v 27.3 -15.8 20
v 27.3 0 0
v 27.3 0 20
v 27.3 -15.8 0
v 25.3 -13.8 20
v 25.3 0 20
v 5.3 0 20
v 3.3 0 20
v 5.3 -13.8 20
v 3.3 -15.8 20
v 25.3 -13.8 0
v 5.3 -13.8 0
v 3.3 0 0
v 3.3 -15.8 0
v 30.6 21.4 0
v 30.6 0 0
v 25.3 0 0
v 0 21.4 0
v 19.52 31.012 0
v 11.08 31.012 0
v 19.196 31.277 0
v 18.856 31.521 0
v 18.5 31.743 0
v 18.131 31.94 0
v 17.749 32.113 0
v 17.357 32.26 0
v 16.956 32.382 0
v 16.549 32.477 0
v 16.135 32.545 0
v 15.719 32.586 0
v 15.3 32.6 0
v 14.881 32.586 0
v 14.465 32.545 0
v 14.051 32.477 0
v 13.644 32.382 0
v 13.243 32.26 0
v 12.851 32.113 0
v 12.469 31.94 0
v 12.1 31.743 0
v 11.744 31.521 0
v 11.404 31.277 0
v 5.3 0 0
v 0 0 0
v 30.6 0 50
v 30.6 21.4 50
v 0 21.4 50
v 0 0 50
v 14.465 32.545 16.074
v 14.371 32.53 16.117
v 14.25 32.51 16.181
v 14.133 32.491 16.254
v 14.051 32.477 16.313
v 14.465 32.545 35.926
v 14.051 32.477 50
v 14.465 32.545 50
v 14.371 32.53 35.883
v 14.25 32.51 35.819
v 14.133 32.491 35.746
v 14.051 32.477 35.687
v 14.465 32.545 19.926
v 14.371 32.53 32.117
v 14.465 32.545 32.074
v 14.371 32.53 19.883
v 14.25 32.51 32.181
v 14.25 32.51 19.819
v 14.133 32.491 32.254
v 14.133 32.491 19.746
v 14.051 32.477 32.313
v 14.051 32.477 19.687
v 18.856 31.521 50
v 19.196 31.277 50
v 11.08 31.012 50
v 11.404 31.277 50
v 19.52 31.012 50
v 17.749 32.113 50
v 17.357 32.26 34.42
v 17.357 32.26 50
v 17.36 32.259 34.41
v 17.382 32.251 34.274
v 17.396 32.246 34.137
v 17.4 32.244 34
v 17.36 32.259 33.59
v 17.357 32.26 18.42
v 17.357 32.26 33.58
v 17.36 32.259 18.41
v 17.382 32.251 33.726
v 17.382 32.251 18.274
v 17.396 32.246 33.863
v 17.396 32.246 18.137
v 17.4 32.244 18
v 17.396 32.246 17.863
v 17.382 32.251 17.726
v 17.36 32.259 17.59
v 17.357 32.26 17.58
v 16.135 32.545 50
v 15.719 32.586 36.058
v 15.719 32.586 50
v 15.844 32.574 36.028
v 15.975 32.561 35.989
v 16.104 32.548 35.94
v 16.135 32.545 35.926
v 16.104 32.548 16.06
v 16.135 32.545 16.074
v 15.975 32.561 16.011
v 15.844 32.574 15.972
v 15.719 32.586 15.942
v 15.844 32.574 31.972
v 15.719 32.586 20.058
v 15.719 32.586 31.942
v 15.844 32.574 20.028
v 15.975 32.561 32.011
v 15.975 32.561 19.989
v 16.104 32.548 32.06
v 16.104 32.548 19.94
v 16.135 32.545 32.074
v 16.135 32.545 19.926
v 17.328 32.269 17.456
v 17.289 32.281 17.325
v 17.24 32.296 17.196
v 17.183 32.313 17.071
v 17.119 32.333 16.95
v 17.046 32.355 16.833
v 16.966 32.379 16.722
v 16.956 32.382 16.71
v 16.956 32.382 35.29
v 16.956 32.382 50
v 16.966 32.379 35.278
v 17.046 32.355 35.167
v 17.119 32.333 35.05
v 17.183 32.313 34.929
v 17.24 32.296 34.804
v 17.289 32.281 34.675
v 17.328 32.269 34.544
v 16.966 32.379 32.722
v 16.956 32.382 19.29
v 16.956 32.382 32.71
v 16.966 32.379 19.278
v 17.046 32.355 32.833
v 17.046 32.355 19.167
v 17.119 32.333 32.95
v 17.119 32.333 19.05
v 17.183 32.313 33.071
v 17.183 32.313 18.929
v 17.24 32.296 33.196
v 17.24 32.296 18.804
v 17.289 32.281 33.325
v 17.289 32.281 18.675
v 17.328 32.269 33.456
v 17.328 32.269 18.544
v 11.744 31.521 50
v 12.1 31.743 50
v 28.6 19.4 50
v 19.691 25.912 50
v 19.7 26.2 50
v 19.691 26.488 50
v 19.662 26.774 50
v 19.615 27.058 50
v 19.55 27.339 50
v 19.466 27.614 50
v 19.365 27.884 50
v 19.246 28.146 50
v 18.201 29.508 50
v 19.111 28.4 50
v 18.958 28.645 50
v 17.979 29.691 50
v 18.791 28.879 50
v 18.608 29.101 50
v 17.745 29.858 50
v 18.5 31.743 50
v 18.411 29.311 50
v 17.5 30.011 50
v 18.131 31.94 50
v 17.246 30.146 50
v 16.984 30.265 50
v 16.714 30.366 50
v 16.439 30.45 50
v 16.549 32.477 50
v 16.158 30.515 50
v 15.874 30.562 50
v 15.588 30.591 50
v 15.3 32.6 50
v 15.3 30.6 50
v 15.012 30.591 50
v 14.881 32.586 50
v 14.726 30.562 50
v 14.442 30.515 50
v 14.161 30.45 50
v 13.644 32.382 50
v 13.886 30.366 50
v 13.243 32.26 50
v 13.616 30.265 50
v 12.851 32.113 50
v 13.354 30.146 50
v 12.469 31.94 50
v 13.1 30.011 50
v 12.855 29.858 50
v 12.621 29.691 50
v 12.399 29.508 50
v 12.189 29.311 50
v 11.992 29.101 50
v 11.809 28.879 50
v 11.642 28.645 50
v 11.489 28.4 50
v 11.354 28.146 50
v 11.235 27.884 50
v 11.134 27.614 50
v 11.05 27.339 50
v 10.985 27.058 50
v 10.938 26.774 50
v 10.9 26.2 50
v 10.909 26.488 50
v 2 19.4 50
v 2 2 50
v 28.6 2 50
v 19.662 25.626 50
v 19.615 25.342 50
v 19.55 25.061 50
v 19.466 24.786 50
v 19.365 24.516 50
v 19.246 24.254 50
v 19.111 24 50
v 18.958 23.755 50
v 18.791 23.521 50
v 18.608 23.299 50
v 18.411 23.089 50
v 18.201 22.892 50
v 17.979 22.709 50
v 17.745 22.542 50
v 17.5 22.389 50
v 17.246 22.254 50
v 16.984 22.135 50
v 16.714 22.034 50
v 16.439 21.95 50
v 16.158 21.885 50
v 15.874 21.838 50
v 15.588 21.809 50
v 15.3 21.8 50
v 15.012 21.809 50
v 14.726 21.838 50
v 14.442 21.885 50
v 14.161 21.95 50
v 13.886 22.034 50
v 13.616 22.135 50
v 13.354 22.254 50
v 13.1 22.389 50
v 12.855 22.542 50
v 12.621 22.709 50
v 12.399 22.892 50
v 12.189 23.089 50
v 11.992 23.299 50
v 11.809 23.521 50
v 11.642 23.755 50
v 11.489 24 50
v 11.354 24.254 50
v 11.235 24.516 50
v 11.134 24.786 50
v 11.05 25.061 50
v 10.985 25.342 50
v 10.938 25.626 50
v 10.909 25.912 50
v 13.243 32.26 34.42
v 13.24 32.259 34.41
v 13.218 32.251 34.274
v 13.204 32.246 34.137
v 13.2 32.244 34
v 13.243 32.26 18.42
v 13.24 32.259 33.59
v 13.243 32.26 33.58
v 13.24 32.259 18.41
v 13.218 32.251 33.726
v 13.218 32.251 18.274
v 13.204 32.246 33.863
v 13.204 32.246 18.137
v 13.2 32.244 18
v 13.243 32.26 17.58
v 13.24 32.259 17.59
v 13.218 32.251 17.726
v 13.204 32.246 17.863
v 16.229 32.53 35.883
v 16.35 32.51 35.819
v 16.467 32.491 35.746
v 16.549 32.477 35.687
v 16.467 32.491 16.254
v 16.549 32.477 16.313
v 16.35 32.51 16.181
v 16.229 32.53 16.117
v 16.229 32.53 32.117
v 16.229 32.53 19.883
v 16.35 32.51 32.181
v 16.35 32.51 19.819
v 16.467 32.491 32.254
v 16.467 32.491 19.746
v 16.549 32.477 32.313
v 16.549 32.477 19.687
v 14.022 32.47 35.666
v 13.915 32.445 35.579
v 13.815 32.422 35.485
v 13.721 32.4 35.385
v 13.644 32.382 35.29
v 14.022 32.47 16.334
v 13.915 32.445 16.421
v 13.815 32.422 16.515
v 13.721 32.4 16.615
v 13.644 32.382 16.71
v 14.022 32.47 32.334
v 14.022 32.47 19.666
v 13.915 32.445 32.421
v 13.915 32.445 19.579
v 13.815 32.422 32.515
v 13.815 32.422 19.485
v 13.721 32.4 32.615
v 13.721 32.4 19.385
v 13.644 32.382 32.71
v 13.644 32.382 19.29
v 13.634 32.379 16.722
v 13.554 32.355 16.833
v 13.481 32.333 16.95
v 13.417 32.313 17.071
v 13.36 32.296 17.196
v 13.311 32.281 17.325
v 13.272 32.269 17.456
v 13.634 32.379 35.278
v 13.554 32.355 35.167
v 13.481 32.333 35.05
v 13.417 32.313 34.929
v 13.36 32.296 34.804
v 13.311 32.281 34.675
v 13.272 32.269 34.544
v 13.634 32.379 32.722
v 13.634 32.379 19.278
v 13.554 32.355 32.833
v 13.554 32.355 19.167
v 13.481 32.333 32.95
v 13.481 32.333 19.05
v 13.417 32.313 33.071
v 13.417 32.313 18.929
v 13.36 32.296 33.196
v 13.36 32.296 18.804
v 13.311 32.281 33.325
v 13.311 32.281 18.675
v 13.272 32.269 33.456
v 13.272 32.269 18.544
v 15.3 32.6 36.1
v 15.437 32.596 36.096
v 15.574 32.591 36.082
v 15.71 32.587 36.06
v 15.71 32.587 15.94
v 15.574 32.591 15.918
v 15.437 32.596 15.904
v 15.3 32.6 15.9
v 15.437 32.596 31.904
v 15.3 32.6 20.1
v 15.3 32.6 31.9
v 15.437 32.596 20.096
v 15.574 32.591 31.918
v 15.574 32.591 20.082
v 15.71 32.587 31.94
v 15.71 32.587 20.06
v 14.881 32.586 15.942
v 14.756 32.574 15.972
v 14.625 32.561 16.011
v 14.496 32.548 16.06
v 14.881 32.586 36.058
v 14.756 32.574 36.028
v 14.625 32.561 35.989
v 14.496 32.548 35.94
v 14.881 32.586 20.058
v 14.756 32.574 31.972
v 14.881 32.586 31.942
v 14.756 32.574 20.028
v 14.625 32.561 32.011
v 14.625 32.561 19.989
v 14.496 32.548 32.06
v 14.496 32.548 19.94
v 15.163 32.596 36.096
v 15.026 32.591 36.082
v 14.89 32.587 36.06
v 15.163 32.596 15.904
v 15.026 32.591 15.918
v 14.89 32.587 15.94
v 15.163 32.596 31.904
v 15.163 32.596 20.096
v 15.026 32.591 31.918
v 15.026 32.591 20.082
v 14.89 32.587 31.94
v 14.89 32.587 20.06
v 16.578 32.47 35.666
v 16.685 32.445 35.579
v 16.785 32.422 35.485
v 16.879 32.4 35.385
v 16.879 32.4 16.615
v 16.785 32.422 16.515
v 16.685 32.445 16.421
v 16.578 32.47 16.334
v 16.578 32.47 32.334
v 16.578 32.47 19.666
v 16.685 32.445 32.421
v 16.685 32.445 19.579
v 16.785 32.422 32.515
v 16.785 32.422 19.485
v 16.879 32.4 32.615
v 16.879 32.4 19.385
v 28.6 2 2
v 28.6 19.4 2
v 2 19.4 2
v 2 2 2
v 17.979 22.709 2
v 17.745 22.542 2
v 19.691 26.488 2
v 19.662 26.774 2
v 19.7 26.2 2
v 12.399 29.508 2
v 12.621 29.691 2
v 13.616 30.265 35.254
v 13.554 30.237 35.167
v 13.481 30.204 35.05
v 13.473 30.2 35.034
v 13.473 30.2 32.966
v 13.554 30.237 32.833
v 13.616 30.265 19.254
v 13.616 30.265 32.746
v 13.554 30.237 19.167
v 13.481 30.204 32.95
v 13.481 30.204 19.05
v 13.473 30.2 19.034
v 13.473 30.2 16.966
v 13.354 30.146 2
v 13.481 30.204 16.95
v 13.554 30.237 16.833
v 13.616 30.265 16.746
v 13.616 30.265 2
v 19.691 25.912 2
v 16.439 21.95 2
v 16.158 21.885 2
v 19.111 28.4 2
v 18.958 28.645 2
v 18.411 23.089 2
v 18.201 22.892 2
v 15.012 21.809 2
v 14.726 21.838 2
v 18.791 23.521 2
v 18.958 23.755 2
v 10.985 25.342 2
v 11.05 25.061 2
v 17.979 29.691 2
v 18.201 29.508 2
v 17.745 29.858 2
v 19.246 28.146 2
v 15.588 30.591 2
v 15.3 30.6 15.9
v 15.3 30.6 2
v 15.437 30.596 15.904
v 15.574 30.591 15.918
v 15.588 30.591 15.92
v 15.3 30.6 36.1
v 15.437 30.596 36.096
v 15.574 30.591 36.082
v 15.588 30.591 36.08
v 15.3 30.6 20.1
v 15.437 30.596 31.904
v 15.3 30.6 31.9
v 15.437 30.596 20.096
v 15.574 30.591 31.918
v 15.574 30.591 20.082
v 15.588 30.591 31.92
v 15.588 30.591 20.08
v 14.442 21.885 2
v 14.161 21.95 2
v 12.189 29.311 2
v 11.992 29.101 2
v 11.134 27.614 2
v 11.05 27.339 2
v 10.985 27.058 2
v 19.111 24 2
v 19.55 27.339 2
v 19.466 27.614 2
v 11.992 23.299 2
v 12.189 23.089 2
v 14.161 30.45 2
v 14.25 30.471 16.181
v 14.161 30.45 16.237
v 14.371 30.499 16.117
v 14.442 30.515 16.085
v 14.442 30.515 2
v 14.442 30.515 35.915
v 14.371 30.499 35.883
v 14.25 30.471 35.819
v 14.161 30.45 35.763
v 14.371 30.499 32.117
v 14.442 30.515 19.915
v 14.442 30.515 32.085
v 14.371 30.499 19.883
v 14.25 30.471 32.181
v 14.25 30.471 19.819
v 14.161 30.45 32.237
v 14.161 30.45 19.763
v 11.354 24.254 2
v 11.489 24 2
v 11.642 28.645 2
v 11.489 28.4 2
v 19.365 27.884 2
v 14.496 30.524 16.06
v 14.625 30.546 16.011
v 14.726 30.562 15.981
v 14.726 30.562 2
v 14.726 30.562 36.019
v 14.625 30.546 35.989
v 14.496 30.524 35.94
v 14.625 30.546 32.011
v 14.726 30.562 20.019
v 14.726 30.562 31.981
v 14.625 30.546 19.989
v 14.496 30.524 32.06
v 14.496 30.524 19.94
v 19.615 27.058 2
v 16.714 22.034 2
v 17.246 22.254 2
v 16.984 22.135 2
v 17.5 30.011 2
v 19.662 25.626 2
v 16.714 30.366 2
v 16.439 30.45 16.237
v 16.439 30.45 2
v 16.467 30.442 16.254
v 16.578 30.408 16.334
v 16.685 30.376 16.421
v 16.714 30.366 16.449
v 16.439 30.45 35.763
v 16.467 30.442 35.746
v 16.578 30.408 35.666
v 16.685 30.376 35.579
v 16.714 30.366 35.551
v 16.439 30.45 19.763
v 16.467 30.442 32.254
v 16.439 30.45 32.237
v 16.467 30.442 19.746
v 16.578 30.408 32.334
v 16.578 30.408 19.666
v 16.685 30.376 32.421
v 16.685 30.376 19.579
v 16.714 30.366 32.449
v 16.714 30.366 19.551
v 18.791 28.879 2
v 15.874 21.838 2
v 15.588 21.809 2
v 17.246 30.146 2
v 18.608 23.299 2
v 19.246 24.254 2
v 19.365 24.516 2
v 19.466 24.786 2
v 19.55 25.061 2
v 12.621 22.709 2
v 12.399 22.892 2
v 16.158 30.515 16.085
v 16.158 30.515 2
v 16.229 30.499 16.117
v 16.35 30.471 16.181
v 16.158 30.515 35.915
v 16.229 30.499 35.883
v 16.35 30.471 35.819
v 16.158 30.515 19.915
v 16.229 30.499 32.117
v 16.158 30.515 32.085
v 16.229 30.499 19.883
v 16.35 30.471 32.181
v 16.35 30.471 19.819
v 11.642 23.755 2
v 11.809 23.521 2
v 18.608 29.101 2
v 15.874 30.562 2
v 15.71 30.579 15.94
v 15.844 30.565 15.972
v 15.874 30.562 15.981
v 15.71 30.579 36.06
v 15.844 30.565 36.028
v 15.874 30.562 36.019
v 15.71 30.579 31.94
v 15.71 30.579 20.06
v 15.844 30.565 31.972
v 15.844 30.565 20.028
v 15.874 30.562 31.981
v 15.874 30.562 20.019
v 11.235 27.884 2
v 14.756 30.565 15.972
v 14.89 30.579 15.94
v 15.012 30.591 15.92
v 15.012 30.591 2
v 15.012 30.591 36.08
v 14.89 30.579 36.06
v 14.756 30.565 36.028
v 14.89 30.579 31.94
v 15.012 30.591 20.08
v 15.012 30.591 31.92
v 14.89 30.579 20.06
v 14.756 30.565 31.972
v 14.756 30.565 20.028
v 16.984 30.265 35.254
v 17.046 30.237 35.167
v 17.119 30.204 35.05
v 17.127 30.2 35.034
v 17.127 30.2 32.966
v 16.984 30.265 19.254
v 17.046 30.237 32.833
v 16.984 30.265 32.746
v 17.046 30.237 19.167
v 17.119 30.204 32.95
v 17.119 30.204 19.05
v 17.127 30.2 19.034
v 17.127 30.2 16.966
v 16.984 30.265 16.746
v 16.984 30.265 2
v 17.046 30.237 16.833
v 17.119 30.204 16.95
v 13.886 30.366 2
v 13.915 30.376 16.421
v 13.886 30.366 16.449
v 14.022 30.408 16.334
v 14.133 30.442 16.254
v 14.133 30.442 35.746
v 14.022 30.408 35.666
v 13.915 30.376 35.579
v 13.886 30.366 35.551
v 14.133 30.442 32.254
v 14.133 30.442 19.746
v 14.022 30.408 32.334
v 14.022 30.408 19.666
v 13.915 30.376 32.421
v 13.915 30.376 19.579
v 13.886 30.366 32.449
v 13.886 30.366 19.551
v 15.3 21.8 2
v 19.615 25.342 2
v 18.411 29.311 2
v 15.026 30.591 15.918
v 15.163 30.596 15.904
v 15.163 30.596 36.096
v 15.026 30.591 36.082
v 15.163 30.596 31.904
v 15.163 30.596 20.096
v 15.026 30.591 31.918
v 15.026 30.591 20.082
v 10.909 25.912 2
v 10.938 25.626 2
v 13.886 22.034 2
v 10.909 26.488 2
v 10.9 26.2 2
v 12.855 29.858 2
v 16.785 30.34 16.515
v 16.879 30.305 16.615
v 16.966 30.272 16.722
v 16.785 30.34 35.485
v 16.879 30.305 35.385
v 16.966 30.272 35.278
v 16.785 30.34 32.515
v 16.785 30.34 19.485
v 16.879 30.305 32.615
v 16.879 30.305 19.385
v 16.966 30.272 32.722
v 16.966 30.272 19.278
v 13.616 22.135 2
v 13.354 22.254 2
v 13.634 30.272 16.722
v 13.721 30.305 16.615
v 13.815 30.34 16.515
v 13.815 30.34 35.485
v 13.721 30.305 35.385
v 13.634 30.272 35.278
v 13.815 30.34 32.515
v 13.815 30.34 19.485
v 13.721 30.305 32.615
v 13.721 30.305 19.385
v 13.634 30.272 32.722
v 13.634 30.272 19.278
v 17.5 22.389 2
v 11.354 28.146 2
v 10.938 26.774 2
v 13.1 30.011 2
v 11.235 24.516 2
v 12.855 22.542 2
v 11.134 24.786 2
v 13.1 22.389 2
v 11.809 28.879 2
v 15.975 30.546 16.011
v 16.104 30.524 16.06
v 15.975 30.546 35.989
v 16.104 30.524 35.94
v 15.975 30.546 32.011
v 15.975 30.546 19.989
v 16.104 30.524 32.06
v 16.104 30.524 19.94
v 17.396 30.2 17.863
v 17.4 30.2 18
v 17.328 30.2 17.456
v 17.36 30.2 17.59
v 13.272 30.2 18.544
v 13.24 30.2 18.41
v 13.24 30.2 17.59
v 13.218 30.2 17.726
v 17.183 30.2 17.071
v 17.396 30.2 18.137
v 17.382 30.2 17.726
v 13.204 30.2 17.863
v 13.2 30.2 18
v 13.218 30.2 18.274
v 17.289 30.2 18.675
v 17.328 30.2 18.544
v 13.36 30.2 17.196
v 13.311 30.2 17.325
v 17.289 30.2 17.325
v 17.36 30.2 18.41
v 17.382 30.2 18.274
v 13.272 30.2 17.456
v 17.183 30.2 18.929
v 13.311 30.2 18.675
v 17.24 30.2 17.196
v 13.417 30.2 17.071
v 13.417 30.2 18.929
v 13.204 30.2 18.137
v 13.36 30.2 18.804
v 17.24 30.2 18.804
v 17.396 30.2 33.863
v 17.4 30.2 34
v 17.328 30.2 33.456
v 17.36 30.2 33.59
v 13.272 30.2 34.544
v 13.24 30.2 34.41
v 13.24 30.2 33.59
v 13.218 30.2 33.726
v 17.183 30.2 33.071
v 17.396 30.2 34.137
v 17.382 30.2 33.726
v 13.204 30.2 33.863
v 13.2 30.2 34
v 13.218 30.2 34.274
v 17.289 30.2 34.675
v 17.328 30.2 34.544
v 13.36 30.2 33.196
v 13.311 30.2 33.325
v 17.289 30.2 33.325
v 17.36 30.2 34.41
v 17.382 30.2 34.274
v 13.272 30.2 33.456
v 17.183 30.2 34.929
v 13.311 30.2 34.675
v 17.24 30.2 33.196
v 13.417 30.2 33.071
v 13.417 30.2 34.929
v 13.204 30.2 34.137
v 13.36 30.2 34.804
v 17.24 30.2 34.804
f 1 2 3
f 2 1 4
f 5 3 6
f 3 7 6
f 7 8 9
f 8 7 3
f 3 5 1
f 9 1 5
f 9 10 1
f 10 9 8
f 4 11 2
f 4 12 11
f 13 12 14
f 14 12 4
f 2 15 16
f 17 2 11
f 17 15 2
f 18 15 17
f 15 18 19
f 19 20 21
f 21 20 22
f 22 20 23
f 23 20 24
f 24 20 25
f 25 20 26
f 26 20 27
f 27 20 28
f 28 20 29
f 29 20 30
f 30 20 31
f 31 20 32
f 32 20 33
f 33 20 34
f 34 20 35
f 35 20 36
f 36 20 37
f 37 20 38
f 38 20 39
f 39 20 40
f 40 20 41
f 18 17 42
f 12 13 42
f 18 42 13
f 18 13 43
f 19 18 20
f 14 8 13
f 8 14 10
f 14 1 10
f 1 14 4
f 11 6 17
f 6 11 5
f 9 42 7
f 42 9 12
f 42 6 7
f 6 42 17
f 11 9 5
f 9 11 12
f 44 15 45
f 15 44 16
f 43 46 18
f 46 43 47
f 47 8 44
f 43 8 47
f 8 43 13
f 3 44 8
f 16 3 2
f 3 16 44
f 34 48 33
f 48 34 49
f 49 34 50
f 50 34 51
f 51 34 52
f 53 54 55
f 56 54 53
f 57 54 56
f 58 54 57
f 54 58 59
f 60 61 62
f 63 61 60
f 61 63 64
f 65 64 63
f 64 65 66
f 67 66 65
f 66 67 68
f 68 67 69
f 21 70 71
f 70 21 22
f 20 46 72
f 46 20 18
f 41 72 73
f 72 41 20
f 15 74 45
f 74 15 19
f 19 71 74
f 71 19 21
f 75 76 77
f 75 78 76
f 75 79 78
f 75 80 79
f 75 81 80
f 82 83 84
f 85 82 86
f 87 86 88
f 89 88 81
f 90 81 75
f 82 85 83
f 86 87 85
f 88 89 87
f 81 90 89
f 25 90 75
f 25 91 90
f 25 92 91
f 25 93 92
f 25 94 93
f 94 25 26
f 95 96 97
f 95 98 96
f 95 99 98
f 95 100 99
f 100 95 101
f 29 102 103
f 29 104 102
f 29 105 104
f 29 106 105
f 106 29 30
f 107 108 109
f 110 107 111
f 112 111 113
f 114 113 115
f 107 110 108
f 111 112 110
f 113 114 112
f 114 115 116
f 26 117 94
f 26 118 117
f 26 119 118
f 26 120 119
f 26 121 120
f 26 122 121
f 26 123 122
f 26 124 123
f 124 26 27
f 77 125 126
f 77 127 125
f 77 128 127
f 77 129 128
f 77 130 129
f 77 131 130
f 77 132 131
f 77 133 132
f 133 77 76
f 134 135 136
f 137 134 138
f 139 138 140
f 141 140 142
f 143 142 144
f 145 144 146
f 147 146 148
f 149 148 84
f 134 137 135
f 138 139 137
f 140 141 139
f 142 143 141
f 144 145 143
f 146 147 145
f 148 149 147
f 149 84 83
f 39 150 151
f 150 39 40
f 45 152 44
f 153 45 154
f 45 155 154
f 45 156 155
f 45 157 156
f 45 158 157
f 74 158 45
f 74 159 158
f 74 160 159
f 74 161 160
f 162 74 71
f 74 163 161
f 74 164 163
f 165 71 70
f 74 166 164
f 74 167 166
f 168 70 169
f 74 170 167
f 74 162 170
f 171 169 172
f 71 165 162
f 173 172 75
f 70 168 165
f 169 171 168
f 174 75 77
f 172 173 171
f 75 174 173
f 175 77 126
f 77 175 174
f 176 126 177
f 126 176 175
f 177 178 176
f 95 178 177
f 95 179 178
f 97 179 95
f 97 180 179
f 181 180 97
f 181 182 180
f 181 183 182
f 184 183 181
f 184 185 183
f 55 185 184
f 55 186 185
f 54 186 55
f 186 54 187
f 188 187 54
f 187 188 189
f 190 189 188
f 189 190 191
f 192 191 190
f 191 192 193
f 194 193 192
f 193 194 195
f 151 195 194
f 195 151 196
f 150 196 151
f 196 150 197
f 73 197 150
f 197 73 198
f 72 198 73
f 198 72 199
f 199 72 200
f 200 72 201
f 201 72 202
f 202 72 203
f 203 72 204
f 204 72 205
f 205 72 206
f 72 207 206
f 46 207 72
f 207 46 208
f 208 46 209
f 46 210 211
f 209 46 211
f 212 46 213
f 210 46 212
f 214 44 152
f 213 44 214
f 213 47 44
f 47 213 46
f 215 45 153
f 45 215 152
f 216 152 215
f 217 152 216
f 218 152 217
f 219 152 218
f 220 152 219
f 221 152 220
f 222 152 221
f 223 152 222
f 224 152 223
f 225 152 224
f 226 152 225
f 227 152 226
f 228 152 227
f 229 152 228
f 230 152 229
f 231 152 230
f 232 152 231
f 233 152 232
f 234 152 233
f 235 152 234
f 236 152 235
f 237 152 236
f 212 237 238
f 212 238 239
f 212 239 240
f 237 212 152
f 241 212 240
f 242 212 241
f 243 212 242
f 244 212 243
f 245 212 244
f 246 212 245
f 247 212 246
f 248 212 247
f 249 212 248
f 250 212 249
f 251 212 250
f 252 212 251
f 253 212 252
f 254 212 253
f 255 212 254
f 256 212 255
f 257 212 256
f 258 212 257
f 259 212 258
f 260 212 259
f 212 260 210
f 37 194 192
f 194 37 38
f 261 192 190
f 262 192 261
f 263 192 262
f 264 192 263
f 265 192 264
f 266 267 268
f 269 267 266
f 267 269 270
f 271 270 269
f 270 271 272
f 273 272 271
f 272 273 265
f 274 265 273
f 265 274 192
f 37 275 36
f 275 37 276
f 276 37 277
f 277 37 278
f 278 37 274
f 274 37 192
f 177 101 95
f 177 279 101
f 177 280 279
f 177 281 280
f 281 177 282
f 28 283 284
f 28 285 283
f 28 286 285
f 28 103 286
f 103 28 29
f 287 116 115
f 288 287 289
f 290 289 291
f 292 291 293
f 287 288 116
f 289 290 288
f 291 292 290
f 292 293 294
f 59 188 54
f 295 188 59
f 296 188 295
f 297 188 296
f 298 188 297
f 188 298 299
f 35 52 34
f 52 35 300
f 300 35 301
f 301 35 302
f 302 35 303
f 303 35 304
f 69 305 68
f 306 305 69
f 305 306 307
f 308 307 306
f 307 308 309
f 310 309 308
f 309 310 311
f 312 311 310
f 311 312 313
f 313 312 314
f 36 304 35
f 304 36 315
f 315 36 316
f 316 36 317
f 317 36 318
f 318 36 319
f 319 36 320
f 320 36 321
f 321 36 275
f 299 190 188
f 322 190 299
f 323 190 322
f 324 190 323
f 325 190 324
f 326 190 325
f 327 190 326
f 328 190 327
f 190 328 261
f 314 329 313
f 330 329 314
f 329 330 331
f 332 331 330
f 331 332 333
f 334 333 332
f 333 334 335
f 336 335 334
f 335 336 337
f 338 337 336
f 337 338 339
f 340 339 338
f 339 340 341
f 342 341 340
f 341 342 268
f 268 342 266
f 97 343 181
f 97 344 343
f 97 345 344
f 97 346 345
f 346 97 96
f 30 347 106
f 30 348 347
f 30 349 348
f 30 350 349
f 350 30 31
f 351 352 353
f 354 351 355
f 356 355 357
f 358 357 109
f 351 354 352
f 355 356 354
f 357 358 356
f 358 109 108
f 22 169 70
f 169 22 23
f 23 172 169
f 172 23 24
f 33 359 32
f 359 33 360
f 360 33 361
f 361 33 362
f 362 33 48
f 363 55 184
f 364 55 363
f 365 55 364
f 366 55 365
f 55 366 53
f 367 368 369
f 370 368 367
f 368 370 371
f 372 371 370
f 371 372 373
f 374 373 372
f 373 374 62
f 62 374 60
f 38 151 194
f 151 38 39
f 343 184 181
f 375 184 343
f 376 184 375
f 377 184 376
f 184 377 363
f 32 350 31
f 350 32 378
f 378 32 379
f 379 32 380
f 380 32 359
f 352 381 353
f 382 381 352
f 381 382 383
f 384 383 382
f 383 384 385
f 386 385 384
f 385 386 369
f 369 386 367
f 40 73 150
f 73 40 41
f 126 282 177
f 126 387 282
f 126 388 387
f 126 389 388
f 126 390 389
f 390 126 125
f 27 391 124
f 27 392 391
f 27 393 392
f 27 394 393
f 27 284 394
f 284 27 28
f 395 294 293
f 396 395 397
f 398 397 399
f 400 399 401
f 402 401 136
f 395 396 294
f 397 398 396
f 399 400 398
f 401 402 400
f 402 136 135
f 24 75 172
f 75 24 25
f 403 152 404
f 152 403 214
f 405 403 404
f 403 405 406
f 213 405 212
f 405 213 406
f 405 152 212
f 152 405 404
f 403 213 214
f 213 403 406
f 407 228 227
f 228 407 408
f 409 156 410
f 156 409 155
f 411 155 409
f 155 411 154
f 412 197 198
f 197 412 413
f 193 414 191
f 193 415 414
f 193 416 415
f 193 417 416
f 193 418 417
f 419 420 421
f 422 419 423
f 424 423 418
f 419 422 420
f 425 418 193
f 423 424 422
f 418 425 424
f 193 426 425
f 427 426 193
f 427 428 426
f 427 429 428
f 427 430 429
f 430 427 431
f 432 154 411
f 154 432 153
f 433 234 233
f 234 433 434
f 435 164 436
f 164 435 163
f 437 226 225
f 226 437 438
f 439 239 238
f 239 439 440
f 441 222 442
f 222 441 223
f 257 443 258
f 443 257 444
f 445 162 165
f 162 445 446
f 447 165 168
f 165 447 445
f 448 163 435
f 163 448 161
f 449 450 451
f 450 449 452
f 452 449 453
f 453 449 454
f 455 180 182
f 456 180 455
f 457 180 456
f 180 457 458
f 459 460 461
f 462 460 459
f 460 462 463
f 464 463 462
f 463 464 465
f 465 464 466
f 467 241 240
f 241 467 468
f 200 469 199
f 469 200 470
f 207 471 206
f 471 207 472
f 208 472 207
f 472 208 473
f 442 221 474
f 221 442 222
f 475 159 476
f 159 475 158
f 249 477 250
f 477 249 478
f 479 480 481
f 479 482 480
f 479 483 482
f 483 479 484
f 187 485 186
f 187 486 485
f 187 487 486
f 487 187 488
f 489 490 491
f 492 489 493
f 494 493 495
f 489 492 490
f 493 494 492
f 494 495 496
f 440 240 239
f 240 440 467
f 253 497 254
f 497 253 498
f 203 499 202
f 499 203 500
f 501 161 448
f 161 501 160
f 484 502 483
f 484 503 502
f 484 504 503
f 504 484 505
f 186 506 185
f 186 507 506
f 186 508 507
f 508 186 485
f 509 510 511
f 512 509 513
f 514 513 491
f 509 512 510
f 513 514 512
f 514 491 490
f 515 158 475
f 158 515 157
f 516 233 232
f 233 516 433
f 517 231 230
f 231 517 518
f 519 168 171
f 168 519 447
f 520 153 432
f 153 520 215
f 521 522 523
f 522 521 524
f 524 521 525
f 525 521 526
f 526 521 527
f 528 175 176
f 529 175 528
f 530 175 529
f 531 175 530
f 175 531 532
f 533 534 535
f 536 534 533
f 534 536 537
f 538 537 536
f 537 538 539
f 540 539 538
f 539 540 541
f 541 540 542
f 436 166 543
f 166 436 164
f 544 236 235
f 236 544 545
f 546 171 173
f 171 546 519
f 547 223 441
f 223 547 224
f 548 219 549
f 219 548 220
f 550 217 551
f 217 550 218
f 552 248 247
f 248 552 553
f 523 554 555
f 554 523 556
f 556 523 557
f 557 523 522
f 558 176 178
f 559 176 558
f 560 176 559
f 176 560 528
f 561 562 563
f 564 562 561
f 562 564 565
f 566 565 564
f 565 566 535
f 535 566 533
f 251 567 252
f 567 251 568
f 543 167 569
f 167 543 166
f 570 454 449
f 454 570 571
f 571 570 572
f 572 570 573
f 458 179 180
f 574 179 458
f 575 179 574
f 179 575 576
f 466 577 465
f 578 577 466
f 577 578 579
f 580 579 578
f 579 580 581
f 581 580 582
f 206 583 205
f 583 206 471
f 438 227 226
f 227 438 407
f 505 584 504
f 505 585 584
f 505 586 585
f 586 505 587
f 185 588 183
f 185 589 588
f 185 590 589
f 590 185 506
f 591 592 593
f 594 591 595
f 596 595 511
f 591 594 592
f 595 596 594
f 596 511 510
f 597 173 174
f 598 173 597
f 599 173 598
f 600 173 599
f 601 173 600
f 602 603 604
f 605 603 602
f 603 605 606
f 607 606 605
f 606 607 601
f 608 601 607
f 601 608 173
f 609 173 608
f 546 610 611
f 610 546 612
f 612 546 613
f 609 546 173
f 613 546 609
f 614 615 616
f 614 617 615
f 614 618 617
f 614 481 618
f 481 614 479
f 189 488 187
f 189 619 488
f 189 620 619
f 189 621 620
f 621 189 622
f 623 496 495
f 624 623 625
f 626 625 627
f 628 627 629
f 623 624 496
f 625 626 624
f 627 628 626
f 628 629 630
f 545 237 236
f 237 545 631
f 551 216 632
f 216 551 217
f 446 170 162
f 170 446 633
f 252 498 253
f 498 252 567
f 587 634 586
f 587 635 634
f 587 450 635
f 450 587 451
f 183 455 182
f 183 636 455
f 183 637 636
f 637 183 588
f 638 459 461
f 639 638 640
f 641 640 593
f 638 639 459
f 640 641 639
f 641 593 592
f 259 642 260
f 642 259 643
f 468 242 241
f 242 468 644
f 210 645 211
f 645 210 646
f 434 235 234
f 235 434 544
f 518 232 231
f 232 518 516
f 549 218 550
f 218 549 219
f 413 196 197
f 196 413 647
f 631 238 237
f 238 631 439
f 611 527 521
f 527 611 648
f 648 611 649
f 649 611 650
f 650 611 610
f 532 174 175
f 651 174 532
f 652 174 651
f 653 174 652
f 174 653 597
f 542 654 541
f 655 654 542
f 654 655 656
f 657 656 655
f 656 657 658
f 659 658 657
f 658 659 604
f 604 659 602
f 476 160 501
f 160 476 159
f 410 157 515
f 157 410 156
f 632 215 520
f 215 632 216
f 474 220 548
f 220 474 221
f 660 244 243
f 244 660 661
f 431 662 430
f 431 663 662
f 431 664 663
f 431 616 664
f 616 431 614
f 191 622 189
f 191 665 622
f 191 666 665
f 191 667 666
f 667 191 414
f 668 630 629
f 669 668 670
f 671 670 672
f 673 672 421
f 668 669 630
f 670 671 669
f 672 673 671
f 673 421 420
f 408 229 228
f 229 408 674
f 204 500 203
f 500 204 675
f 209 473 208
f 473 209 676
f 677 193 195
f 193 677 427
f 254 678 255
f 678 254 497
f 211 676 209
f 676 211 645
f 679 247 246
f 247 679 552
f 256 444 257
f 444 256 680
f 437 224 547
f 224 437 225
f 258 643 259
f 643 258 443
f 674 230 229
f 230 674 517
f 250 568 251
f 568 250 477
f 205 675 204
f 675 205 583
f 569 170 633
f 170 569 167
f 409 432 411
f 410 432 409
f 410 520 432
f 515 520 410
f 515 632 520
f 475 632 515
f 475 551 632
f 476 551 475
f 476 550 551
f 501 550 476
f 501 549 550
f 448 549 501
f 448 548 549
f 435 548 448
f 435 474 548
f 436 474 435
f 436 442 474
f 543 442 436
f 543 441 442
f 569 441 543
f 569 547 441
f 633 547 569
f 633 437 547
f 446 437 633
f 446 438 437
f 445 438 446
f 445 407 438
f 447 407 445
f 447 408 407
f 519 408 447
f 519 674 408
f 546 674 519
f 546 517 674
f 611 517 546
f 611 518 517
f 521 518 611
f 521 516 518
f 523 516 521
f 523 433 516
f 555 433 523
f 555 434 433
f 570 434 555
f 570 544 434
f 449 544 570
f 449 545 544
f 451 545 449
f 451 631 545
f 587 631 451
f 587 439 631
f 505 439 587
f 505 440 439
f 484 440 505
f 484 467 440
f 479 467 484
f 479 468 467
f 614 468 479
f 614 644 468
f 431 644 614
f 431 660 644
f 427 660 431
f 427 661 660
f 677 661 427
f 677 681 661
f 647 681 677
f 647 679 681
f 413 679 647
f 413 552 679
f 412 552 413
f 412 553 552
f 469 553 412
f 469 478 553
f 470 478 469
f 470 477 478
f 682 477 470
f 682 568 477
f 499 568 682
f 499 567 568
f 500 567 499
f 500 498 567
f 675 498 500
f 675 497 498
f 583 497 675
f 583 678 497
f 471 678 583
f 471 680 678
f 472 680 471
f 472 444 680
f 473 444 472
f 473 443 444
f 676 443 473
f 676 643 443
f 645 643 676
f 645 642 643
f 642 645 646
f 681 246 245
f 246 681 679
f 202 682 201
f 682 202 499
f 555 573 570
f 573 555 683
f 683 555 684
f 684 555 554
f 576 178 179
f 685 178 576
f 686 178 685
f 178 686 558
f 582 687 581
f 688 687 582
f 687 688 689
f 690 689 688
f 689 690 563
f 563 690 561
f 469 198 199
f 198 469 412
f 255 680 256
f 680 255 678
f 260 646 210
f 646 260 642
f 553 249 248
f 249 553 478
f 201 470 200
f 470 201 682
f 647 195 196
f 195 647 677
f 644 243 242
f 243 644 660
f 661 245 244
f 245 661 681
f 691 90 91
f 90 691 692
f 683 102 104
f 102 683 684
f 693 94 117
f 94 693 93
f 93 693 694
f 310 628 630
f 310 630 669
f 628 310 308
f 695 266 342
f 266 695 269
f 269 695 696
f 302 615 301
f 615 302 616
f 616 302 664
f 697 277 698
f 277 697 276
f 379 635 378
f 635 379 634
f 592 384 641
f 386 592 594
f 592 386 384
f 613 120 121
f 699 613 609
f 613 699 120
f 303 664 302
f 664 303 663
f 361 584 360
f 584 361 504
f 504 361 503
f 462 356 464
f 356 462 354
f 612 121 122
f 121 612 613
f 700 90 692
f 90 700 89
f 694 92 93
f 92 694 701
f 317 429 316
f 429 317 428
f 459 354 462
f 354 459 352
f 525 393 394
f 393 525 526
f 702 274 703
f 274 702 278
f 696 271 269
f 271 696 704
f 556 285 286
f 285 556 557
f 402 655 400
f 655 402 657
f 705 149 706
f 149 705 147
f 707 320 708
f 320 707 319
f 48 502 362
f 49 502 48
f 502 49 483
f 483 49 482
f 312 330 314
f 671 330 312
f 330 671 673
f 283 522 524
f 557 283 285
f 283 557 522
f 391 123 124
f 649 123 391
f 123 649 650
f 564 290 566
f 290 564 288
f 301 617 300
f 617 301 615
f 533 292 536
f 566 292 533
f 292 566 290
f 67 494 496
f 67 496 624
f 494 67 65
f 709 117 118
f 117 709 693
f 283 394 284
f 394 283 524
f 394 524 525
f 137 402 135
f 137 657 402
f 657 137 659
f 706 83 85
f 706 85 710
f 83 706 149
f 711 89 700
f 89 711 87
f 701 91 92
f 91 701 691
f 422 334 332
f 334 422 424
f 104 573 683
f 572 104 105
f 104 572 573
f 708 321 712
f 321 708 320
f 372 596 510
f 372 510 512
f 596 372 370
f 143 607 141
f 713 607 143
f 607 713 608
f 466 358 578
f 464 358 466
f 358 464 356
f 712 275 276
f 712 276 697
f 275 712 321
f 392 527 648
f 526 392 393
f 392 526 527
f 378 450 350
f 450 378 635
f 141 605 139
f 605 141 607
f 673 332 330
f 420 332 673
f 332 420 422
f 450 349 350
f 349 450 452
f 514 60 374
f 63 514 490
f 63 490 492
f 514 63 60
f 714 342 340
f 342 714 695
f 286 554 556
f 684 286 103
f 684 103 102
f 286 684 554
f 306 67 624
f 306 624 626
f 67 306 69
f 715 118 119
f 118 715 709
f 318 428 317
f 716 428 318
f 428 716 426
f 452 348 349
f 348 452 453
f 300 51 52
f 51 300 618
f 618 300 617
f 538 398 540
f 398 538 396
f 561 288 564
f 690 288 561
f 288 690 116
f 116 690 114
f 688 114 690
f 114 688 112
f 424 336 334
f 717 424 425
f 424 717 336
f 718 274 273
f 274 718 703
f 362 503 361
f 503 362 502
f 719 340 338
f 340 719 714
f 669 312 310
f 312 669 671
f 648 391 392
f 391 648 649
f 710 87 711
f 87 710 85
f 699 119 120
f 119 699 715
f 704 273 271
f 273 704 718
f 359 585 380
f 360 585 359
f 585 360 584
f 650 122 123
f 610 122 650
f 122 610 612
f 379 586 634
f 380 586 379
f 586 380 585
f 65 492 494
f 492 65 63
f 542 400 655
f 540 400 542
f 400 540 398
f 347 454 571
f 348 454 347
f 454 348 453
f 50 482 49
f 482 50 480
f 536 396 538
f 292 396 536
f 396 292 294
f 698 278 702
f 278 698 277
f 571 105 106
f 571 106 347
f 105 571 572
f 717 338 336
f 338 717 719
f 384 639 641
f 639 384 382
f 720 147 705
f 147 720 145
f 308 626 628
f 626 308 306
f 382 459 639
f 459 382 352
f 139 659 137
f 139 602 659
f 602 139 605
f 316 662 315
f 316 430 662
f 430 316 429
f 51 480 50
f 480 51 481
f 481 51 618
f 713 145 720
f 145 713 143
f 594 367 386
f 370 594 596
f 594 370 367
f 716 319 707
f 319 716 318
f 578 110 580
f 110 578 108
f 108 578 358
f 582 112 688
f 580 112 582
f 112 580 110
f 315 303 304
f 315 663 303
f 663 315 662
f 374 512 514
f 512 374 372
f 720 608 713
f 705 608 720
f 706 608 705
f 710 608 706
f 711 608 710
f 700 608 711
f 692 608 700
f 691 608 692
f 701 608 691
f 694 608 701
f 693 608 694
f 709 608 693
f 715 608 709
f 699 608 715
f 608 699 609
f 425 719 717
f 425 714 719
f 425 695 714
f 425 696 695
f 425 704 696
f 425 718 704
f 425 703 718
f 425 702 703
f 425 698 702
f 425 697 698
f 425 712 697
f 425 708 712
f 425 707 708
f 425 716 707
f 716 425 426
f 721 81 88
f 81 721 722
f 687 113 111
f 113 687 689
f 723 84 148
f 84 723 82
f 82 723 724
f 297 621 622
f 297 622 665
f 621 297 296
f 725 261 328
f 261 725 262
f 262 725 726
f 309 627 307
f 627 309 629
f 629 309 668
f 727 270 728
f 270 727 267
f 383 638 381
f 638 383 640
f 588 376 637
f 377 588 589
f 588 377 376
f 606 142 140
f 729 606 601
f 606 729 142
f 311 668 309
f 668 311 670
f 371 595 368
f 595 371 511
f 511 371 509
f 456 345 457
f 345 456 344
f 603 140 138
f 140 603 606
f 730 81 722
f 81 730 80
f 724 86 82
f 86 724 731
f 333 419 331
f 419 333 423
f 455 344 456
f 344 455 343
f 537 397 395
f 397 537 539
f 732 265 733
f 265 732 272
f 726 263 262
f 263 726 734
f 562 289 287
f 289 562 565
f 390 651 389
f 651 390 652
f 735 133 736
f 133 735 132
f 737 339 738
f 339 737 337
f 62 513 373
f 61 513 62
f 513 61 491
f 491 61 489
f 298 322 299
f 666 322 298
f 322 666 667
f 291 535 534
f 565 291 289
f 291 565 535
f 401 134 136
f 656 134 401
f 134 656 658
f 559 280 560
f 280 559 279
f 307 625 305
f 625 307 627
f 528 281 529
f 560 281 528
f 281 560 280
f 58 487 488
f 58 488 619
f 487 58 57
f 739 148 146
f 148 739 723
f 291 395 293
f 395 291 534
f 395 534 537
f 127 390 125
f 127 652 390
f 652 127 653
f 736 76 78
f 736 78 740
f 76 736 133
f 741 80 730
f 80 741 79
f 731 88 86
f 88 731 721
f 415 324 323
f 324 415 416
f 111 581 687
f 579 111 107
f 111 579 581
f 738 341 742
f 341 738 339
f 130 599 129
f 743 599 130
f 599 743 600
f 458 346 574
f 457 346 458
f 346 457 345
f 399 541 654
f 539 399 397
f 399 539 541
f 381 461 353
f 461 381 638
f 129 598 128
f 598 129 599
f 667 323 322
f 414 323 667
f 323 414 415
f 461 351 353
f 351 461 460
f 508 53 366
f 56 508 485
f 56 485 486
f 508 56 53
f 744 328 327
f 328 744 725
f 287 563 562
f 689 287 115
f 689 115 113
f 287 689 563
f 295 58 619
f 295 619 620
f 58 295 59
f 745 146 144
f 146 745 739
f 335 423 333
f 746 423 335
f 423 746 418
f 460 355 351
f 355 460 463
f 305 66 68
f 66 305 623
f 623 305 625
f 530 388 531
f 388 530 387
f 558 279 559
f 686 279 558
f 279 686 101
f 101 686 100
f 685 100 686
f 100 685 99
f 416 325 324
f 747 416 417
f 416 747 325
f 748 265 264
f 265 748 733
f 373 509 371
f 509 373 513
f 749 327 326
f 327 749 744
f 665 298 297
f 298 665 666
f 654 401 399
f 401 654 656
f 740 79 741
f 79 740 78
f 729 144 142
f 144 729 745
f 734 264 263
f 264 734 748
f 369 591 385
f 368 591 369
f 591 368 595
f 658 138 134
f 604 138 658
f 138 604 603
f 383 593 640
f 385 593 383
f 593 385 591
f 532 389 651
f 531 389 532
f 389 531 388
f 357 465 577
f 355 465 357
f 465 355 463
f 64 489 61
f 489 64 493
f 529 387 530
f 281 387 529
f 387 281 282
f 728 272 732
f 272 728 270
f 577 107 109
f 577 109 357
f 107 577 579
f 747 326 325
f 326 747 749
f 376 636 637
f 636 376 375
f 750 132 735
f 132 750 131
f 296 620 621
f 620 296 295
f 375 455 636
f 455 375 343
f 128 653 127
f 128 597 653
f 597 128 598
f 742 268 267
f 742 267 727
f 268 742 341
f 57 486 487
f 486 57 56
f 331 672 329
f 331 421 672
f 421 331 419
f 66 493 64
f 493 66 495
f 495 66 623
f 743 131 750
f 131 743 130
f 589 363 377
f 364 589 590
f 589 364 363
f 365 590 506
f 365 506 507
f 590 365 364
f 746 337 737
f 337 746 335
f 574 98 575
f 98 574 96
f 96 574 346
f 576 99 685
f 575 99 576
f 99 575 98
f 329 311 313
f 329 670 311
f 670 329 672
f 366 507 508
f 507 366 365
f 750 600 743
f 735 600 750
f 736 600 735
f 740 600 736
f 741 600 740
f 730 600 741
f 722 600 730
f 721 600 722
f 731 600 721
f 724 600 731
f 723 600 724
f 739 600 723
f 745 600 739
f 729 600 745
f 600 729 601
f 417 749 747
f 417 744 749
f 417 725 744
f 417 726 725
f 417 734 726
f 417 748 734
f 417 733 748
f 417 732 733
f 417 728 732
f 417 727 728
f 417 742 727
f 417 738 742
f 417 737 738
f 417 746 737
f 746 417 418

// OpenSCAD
///////////////
// Variables //
///////////////

/* [Option] */

// 0: without switch block, 1: With switch block
switch = 1;

/* [General] */

// Battery case height
b_height = 48;

// Battery case length
b_length = 26.6;

// Battery case width
b_width = 17.4;

// Latern stick diameter
stick_diameter = 8.8;

// Screw hole diameter
screw_hole_diameter = 4.2;

/* [Switch] */

// Switch width
switch_x = 20;

// Switch length
switch_y = 13.8;

// Switch height
switch_z = 20;


/* [Misc] */

// Resolution
$fn=96;

// Avoid artifacts
clearance = 0.01;

// Wall width
wall_width = 2;


///////////
// Build //
///////////

if (switch) {
    translate([
        (b_length+2*wall_width)/2-switch_x/2-wall_width,
        -switch_y-wall_width,
        0
    ]) {
        difference() {
            cube([
                switch_x+2*wall_width,
                switch_y+2*wall_width,
                switch_z
            ]);
            translate([wall_width,wall_width,-clearance]) {
                cube([
                    switch_x,
                    switch_y,
                    switch_z+2*clearance
                ]);
            }
        }
    };
}

difference() {

    hull() {

        // Outer cube
        cube([
            b_length+2*wall_width,
            b_width+2*wall_width,
            b_height+wall_width
        ]);
        
        // Stick case
        translate([
            (b_length+2*wall_width)/2,
            (b_width)+stick_diameter,
            0
        ]) {
            cylinder(
                d=stick_diameter+2*wall_width,
                h=b_height+wall_width
            );
        }
    }

    // Battery hole
    translate([wall_width,wall_width,wall_width]){
        cube([b_length, b_width, b_height+clearance]);
    }
    
    // Stick hole
    translate([
        (b_length+2*wall_width)/2,
        (b_width)+stick_diameter,
        wall_width
    ]) {
        cylinder(
            d=stick_diameter,
            h=b_height+wall_width+clearance
        );
    }
    
    translate([
        (b_length+2*wall_width)/2,
        b_width+stick_diameter+2*wall_width,
        b_height/3+wall_width
    ]) {
        rotate(270, [1,0,0]) {
            cylinder(
                d=screw_hole_diameter,
                h=2*wall_width+clearance
            );
        }
    }
    
    translate([
        (b_length+2*wall_width)/2,
        b_width+stick_diameter+2*wall_width,
        b_height/3*2+wall_width
    ]) {
        rotate(270, [1,0,0]) {
            cylinder(
                d=screw_hole_diameter,
                h=2*wall_width+clearance
            );
        }
    }
}
